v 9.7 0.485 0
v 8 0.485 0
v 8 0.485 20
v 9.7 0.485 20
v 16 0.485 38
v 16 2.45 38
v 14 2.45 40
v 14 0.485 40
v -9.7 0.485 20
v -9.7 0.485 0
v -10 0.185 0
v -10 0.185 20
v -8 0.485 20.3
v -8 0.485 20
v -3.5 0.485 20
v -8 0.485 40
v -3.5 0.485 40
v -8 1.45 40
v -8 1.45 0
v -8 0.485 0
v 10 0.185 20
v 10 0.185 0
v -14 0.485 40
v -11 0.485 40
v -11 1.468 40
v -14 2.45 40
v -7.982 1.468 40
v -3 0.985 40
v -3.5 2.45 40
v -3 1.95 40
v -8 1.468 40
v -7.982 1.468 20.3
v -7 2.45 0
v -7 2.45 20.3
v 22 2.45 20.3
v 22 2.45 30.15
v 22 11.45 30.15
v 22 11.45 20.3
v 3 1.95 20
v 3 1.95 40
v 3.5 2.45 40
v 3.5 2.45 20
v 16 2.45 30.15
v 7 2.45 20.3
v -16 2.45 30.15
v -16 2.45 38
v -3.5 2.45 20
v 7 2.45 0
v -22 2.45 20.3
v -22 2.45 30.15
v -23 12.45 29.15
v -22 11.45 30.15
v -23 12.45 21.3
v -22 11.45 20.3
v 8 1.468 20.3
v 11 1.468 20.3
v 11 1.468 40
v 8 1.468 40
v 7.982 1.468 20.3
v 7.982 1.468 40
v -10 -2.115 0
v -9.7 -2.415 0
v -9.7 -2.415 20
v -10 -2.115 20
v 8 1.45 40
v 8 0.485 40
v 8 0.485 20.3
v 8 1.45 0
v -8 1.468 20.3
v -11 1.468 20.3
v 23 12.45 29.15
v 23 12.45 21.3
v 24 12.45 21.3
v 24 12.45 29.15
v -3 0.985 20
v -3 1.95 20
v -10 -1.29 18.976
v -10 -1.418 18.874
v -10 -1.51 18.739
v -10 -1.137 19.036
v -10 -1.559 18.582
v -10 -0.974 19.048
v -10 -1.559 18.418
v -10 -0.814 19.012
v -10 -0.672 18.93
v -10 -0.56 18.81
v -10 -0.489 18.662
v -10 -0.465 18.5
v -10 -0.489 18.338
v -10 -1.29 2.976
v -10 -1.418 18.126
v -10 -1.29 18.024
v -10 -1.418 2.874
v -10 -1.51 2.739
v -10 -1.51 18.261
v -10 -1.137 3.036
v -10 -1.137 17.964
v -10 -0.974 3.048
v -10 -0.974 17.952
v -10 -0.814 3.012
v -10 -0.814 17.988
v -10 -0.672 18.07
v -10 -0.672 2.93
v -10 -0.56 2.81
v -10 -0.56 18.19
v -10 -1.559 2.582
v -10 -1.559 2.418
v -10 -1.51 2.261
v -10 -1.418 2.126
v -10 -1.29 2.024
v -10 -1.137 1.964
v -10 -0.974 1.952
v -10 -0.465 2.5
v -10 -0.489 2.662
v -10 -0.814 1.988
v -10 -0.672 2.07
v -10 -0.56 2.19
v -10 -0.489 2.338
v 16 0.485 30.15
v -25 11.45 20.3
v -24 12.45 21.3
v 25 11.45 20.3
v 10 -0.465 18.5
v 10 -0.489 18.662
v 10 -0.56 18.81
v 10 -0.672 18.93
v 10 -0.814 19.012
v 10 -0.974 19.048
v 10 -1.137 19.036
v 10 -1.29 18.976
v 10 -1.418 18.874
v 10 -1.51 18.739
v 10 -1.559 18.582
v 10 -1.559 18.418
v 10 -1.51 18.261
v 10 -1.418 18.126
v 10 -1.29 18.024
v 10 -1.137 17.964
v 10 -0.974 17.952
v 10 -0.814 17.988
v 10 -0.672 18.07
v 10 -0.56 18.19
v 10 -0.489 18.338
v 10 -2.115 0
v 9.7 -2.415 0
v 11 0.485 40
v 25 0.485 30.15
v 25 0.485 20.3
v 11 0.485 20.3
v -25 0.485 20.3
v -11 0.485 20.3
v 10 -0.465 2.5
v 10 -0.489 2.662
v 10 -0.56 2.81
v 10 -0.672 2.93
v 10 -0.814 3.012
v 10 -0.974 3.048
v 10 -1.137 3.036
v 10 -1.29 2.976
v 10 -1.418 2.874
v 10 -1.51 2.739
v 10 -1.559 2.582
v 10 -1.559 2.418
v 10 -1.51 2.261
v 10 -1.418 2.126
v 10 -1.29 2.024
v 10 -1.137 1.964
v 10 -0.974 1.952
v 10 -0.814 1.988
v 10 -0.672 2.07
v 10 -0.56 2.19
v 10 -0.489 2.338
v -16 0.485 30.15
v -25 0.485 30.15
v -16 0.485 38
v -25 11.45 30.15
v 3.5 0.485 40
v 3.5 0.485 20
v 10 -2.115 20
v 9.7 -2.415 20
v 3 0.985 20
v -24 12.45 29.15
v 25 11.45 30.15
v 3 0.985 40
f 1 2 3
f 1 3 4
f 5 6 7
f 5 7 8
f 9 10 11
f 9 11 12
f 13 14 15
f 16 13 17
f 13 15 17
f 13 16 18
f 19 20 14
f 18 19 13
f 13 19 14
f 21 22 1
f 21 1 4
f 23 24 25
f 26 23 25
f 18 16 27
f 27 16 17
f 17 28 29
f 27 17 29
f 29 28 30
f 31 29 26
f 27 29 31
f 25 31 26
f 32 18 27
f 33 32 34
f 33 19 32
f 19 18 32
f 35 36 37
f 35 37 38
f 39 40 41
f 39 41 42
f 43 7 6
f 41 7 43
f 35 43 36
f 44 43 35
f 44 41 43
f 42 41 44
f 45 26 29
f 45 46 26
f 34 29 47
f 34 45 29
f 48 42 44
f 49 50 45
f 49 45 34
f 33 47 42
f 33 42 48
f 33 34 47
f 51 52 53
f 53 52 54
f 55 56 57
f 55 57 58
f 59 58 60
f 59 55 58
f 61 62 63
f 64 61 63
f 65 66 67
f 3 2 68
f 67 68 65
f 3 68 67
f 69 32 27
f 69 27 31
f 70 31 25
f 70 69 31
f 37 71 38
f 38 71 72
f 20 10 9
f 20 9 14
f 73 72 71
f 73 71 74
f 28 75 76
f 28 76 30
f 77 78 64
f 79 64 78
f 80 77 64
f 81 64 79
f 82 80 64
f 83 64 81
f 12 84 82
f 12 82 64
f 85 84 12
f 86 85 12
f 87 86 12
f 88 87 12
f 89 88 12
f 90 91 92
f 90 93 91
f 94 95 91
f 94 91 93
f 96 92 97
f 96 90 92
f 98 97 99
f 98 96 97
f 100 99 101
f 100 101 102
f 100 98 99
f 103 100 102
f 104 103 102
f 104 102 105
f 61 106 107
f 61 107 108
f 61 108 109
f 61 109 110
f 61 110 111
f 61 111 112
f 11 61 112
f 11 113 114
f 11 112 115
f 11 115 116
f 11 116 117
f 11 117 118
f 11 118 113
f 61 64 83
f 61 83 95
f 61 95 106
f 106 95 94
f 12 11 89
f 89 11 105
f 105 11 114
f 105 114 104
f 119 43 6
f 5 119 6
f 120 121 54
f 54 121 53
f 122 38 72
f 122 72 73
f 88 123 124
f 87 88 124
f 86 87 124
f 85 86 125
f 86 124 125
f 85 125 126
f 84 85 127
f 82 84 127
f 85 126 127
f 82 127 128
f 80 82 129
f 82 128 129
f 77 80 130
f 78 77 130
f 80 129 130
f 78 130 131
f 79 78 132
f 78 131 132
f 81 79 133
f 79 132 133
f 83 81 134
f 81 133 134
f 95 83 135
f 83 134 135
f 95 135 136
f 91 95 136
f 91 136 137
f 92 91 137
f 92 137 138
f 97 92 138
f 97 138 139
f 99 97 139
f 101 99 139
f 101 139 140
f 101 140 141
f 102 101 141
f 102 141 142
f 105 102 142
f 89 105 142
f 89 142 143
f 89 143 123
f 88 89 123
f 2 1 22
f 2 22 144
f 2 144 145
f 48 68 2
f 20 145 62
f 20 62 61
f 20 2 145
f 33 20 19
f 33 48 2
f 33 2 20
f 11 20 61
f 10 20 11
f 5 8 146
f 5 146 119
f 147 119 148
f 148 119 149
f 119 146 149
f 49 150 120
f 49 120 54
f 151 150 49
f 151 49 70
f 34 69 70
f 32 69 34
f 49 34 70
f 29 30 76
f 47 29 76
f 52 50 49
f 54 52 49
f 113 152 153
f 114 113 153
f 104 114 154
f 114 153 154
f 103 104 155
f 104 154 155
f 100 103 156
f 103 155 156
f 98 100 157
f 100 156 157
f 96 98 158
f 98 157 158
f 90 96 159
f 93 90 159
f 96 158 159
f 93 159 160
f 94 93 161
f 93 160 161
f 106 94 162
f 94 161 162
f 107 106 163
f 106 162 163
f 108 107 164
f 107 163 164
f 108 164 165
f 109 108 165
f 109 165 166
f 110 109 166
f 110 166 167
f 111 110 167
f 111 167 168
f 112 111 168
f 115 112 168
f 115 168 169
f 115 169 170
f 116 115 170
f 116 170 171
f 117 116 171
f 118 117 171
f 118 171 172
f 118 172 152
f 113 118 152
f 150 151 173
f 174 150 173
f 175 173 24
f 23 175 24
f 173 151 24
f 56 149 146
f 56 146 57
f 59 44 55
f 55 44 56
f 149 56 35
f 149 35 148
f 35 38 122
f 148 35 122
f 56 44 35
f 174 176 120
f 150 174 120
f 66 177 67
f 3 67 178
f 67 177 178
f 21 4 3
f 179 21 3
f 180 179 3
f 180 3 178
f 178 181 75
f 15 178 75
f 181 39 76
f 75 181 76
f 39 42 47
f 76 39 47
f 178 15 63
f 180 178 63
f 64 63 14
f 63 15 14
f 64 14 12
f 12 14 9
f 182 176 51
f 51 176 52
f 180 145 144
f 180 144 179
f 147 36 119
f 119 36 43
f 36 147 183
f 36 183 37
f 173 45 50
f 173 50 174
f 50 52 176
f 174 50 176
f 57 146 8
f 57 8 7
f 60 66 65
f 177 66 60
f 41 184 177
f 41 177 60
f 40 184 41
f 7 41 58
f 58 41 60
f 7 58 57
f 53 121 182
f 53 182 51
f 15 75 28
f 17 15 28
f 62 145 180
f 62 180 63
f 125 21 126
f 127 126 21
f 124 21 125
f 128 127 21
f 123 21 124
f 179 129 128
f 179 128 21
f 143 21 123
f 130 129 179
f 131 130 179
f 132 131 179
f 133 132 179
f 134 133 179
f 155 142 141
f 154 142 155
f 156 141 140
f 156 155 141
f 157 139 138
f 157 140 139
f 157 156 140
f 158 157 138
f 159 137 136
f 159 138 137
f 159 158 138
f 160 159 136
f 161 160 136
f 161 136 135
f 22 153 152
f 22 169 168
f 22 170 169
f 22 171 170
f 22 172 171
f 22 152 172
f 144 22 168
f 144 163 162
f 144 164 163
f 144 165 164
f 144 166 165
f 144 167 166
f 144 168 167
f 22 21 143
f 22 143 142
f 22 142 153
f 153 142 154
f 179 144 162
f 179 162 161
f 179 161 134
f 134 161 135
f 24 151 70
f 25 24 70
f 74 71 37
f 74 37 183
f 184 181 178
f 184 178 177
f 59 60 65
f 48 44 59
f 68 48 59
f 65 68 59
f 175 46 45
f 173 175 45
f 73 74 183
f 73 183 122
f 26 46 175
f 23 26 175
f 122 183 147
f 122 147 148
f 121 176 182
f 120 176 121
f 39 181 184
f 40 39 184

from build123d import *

# Parameters (mm, degrees)
EXTRUDE_1_DEPTH     = 20
SKETCH_2_R          = 0.55
CUT_EXTRUDE_1_DEPTH = 29.390183162
SKETCH_3_W          = 16
SKETCH_3_H          = 1.96468827
EXTRUDE_2_DEPTH     = 20
SKETCH_4_W          = 6
SKETCH_4_H          = 20
CUT_EXTRUDE_2_DEPTH = 42.332916665
SKETCH_6_W          = 19.7
SKETCH_6_H          = 1.96468827
EXTRUDE_13_DEPTH    = 17
SKETCH_7_W          = 19.7
SKETCH_7_H          = 1.96468827
EXTRUDE_14_DEPTH    = 17
SKETCH_8_W          = 3
SKETCH_8_H          = 9.85
EXTRUDE_15_DEPTH    = 10
CHAMFER_1_SIZE      = 0.3
SKETCH_10_W         = 3
SKETCH_10_H         = 0.982344135
CUT_EXTRUDE_3_DEPTH = 35.526692573
CHAMFER_3_SIZE      = 0.5
CHAMFER_4_DEPTH     = 20.3
CHAMFER_START       = 20.3
CHAMFER_4_2_DEPTH   = 20.7
CHAMFER_5_SIZE      = 1
CUT_EXTRUDE_4_DEPTH = 49.218253805
CHAMFER_6_SIZE      = 2


with BuildPart() as part:
    # 草图1 → 凸台-拉伸1 (new body)
    with BuildSketch(Plane.XY):
        Polygon((-10, 0.48531173), (-8, 0.48531173), (-8, 2.45), (8, 2.45), (8, 0.48531173), (10, 0.48531173), (10, -2.41468827), (-10, -2.41468827), align=None)
    extrude(amount=EXTRUDE_1_DEPTH)

    # 草图2 → 切除-拉伸1 (cut, through all)
    with BuildSketch(Plane(origin=(10, 0, 0), x_dir=(0, 0, -1), z_dir=(1, 0, 0))):
        with Locations(Location((-2.5, -1.01468827, 0), (0, 0, 90))):
            Circle(SKETCH_2_R)
        with Locations(Location((-18.5, -1.01468827, 0), (0, 0, 90))):
            Circle(SKETCH_2_R)
    extrude(amount=-CUT_EXTRUDE_1_DEPTH, mode=Mode.SUBTRACT)

    # 草图3 → 凸台-拉伸2 (add)
    with BuildSketch(Plane.XY.offset(20)):
        with Locations((0, 1.467655865)):
            Rectangle(SKETCH_3_W, SKETCH_3_H)
    extrude(amount=EXTRUDE_2_DEPTH)

    # 草图4 → 切除-拉伸2 (cut, through all)
    with BuildSketch(Plane.XZ.offset(-0.48531173)):
        with Locations((0, 30)):
            Rectangle(SKETCH_4_W, SKETCH_4_H)
    extrude(amount=-CUT_EXTRUDE_2_DEPTH, mode=Mode.SUBTRACT)

    # 草图6 → 凸台-拉伸13 (add)
    with BuildSketch(Plane.ZY.offset(8)):
        with Locations((30.15, 1.467655865)):
            Rectangle(SKETCH_6_W, SKETCH_6_H)
    extrude(amount=EXTRUDE_13_DEPTH)

    # 草图7 → 凸台-拉伸14 (add)
    with BuildSketch(Plane(origin=(8, 0, 0), x_dir=(0, 0, -1), z_dir=(1, 0, 0))):
        with Locations((-30.15, 1.467655865)):
            Rectangle(SKETCH_7_W, SKETCH_7_H)
    extrude(amount=EXTRUDE_14_DEPTH)

    # 草图8 → 凸台-拉伸15 (add)
    with BuildSketch(Plane(origin=(0, 2.45, 0), x_dir=(1, 0, 0), z_dir=(0, 1, 0))):
        with Locations((-23.5, -25.225)):
            Rectangle(SKETCH_8_W, SKETCH_8_H)
        with Locations((23.5, -25.225)):
            Rectangle(SKETCH_8_W, SKETCH_8_H)
    extrude(amount=EXTRUDE_15_DEPTH)

    # 倒角1
    chamfer_1_edges = [part.edges().sort_by_distance(p)[0] for p in [
        (10, -2.41468827, 10),
        (-10, -2.41468827, 10),
        (-10, 0.48531173, 10),
        (10, 0.48531173, 10),
    ]]
    chamfer(chamfer_1_edges, length=CHAMFER_1_SIZE)

    # 草图10 → 切除-拉伸3 (cut, through all)
    with BuildSketch(Plane(origin=(0, 0, 20.3), x_dir=(-1, 0, 0), z_dir=(0, 0, -1))):
        with Locations((-9.5, 0.976483798)):
            Rectangle(SKETCH_10_W, SKETCH_10_H)
        with Locations((9.5, 0.976483798)):
            Rectangle(SKETCH_10_W, SKETCH_10_H)
    extrude(amount=-CUT_EXTRUDE_3_DEPTH, mode=Mode.SUBTRACT)

    # 倒角3
    chamfer_3_edges = [part.edges().sort_by_distance(p)[0] for p in [
        (3, 2.45, 30),
        (-3, 2.45, 30),
        (-3, 0.48531173, 30),
        (3, 0.48531173, 30),
    ]]
    chamfer(chamfer_3_edges, length=CHAMFER_3_SIZE)

    # 倒角4: read off the stored shape, not the designer's step
    # 倒角4 outline → 倒角4 (cut)
    with BuildSketch(Plane.XY):
        Polygon((-8, 1.45), (-7, 2.45), (-8, 2.45), align=None)
        Polygon((8, 2.45), (7, 2.45), (8, 1.45), align=None)
    extrude(amount=CHAMFER_4_DEPTH, mode=Mode.SUBTRACT)

    # Chamfer 4 2 outline → Chamfer 4 2 (cut)
    with BuildSketch(Plane.XY.offset(CHAMFER_START)):
        Polygon((-8, 1.467655865), (-8, 1.45), (-7.982344135, 1.467655865), align=None)
        Polygon((8, 1.467655865), (7.982344135, 1.467655865), (8, 1.45), align=None)
    extrude(amount=CHAMFER_4_2_DEPTH, mode=Mode.SUBTRACT)

    # 倒角5
    chamfer_5_edges = [part.edges().sort_by_distance(p)[0] for p in [
        (23.5, 12.45, 20.3),
        (22, 12.45, 25.225),
        (23.5, 12.45, 30.15),
        (25, 12.45, 25.225),
        (-23.5, 12.45, 20.3),
        (-25, 12.45, 25.225),
        (-23.5, 12.45, 30.15),
        (-22, 12.45, 25.225),
    ]]
    chamfer(chamfer_5_edges, length=CHAMFER_5_SIZE)

    # 草图11 → 切除-拉伸4 (cut, through all)
    with BuildSketch(Plane(origin=(0, 2.45, 0), x_dir=(1, 0, 0), z_dir=(0, 1, 0))):
        Polygon((-22, -30.15), (-25, -30.15), (-25, -40), (-16, -40), (-16, -30.15), align=None)
        Polygon((16, -30.15), (16, -40), (25, -40), (25, -30.15), (22, -30.15), align=None)
    extrude(amount=-CUT_EXTRUDE_4_DEPTH, mode=Mode.SUBTRACT)

    # 倒角6
    chamfer_6_edges = [part.edges().sort_by_distance(p)[0] for p in [
        (-16, 1.467655865, 40),
        (16, 1.467655865, 40),
    ]]
    chamfer(chamfer_6_edges, length=CHAMFER_6_SIZE)


solid = part.part
